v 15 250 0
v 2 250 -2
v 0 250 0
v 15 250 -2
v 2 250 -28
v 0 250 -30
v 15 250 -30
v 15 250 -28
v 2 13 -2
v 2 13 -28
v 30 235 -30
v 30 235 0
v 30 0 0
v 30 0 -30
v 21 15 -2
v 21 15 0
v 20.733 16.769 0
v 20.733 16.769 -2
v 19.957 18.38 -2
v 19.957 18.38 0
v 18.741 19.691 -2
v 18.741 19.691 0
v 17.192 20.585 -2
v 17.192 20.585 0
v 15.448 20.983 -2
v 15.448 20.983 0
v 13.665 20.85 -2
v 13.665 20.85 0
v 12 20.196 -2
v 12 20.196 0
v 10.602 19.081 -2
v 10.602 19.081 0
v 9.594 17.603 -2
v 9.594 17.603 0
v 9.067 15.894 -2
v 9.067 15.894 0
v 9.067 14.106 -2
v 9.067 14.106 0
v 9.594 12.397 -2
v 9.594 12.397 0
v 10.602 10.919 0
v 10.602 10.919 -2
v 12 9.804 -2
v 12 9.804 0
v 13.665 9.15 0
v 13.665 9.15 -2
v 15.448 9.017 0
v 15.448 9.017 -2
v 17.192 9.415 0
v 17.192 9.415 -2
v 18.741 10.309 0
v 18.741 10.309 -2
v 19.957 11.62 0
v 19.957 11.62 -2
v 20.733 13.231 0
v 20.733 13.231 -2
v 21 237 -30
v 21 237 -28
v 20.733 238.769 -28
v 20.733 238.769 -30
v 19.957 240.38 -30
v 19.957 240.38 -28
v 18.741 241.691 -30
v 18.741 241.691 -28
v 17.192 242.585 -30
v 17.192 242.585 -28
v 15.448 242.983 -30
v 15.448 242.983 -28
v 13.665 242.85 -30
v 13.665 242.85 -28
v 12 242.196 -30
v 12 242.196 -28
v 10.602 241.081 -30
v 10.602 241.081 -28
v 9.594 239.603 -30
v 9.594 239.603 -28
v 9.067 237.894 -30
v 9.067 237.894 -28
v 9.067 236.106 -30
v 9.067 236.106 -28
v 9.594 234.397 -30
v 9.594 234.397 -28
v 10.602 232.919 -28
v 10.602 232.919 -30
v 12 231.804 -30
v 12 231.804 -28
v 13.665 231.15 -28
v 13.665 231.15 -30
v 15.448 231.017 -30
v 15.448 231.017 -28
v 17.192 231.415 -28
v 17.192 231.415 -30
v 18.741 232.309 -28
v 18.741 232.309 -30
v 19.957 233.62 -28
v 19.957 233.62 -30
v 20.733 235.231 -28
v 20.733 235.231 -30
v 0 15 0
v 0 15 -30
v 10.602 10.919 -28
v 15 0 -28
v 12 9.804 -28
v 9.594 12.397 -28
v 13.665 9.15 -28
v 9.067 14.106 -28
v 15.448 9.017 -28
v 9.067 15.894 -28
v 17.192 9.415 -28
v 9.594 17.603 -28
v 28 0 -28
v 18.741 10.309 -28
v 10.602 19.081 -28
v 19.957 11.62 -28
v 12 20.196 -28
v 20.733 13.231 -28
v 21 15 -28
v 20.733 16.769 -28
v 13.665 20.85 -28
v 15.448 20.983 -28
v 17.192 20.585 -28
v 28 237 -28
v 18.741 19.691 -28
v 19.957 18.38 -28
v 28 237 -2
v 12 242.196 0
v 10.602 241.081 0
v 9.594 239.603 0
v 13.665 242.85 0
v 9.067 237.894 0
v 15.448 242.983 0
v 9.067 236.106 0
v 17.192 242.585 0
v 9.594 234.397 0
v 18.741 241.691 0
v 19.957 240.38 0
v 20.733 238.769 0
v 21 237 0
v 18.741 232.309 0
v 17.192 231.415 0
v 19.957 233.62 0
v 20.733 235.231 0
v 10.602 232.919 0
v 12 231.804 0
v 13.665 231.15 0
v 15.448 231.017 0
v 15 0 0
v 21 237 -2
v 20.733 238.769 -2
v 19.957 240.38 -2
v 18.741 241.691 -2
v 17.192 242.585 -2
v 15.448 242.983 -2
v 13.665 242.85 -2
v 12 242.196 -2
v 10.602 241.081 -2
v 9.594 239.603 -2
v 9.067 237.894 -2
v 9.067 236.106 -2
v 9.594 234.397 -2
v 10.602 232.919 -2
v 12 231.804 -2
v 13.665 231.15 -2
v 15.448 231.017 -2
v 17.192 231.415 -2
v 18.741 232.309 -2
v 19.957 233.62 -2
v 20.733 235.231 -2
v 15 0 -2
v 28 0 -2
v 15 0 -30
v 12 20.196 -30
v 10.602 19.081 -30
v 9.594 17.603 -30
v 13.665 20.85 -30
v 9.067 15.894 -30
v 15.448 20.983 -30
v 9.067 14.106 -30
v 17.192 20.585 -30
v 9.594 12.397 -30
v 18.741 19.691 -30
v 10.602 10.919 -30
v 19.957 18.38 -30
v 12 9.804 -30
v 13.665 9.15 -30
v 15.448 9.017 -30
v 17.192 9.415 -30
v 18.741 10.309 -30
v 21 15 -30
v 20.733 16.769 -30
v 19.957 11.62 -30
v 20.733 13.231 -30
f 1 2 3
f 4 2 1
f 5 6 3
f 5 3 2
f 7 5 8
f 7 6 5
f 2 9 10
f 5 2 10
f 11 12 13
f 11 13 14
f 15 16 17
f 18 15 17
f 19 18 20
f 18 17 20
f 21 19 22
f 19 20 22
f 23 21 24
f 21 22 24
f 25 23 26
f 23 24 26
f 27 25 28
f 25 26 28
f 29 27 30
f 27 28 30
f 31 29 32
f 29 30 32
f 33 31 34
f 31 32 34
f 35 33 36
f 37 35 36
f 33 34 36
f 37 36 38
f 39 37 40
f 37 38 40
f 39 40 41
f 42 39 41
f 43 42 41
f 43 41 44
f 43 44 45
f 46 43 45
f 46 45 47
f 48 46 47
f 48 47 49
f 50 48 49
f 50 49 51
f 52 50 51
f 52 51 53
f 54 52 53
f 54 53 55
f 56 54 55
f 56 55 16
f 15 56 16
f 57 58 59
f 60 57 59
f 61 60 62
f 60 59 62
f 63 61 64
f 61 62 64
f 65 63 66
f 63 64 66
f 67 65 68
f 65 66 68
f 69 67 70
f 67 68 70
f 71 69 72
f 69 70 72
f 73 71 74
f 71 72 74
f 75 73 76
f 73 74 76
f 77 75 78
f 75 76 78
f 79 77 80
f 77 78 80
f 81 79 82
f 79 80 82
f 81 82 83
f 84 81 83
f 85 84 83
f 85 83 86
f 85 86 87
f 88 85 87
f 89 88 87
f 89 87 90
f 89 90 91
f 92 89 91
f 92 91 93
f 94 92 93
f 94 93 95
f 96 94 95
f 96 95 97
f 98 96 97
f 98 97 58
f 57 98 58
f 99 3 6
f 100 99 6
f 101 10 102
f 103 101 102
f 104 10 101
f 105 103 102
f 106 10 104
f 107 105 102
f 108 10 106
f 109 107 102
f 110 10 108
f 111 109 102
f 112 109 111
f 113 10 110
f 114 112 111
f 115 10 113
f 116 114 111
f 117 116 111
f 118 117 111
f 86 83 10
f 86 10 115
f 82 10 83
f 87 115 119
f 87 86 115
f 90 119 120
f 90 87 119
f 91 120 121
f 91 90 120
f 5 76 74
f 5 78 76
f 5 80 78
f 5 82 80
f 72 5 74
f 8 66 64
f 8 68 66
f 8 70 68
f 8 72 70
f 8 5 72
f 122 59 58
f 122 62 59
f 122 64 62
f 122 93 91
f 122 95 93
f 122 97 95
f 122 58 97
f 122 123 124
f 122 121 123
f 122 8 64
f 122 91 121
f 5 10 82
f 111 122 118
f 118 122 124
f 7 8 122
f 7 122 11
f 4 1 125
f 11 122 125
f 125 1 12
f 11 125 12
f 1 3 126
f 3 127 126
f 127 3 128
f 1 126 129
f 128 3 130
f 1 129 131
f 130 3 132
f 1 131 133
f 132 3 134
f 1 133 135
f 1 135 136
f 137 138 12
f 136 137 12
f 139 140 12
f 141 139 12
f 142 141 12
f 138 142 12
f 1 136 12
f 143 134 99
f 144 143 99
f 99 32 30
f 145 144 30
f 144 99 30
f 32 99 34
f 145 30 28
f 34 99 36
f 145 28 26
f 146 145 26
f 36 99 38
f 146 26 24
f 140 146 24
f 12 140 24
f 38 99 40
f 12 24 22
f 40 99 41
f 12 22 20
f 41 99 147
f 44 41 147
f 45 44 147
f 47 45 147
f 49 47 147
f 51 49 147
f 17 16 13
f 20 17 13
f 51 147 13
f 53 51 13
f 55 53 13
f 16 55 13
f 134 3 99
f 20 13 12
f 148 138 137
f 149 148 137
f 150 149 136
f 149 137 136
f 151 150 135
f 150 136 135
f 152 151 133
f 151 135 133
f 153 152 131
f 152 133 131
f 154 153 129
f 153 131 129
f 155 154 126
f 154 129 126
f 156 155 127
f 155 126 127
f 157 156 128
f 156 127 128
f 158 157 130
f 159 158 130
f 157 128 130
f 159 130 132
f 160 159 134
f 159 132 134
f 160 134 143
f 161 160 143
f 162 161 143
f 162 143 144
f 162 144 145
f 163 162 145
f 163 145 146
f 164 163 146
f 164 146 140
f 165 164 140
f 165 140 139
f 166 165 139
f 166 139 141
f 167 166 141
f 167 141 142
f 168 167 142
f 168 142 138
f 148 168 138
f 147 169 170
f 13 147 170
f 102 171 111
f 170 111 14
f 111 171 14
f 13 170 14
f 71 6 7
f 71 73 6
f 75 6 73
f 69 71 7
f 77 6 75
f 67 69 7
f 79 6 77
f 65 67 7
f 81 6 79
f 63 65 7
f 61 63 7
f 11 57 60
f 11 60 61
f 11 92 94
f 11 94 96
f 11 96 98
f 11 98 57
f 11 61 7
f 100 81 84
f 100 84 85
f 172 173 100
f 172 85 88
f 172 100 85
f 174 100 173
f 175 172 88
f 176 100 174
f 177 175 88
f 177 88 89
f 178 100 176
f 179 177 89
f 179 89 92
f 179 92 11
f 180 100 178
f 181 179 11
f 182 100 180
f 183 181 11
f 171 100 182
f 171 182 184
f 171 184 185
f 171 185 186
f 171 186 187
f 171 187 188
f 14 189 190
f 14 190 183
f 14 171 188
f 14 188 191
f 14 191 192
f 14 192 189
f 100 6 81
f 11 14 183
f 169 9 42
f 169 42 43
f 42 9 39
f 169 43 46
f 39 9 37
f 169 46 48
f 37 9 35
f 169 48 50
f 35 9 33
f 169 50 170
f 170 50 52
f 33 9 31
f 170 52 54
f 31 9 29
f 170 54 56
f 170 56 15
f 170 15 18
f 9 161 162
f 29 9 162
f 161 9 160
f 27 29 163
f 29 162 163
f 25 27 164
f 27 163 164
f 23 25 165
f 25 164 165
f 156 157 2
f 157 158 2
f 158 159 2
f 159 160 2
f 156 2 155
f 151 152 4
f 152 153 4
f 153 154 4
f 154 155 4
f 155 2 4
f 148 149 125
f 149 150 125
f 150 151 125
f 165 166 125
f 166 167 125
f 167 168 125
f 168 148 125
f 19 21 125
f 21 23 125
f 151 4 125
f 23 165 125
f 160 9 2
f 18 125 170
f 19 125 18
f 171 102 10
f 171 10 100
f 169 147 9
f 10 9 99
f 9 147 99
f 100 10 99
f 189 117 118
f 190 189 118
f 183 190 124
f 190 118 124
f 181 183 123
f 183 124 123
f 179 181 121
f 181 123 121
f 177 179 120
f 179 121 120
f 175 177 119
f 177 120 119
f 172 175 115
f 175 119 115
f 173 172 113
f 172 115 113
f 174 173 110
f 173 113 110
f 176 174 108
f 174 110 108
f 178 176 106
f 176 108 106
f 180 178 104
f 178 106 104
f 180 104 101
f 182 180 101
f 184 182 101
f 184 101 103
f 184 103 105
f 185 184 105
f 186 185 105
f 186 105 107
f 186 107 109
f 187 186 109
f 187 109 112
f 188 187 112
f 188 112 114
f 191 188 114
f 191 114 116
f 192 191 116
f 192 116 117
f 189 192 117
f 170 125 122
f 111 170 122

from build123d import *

# Parameters (mm, degrees)
SKETCH_1_W          = 30
SKETCH_1_H          = 30
EXTRUDE_1_DEPTH     = 250
SKETCH_2_W          = 26
SKETCH_2_H          = 26
CUT_EXTRUDE_1_DEPTH = 254.574446662
SKETCH_3_R          = 6
CUT_EXTRUDE_2_DEPTH = 254.574446662
SKETCH_6_R          = 6
CUT_EXTRUDE_4_DEPTH = 254.574446662
CUT_EXTRUDE_5_DEPTH = 254.574446662
CUT_EXTRUDE_6_DEPTH = 254.574446662


with BuildPart() as part:
    # Эскиз1 → Бобышка-Вытянуть1 (new body)
    with BuildSketch(Plane(origin=(0, 0, 0), x_dir=(1, 0, 0), z_dir=(0, 1, 0))):
        with Locations((15, 15)):
            Rectangle(SKETCH_1_W, SKETCH_1_H)
    extrude(amount=EXTRUDE_1_DEPTH)

    # Эскиз2 → Вырез-Вытянуть1 (cut, through all)
    with BuildSketch(Plane(origin=(0, 250, 0), x_dir=(1, 0, 0), z_dir=(0, 1, 0))):
        with Locations((15, 15)):
            Rectangle(SKETCH_2_W, SKETCH_2_H)
    extrude(amount=-CUT_EXTRUDE_1_DEPTH, mode=Mode.SUBTRACT)

    # Эскиз3 → Вырез-Вытянуть2 (cut, through all)
    with BuildSketch(Plane.XY):
        with Locations((15, 15)):
            Circle(SKETCH_3_R)
    extrude(amount=-CUT_EXTRUDE_2_DEPTH, mode=Mode.SUBTRACT)

    # Эскиз6 → Вырез-Вытянуть4 (cut, through all)
    with BuildSketch(Plane.XY):
        with Locations((15, 237)):
            Circle(SKETCH_6_R)
    extrude(amount=-CUT_EXTRUDE_4_DEPTH, mode=Mode.SUBTRACT)

    # Эскиз8 → Вырез-Вытянуть5 (cut, through all)
    with BuildSketch(Plane.XY):
        Polygon((15, 250), (30, 235), (30, 250), align=None)
    extrude(amount=-CUT_EXTRUDE_5_DEPTH, mode=Mode.SUBTRACT)

    # Эскиз9 → Вырез-Вытянуть6 (cut, through all)
    with BuildSketch(Plane.XY):
        Polygon((15, 0), (0, 15), (0, 0), align=None)
    extrude(amount=-CUT_EXTRUDE_6_DEPTH, mode=Mode.SUBTRACT)


solid = part.part
